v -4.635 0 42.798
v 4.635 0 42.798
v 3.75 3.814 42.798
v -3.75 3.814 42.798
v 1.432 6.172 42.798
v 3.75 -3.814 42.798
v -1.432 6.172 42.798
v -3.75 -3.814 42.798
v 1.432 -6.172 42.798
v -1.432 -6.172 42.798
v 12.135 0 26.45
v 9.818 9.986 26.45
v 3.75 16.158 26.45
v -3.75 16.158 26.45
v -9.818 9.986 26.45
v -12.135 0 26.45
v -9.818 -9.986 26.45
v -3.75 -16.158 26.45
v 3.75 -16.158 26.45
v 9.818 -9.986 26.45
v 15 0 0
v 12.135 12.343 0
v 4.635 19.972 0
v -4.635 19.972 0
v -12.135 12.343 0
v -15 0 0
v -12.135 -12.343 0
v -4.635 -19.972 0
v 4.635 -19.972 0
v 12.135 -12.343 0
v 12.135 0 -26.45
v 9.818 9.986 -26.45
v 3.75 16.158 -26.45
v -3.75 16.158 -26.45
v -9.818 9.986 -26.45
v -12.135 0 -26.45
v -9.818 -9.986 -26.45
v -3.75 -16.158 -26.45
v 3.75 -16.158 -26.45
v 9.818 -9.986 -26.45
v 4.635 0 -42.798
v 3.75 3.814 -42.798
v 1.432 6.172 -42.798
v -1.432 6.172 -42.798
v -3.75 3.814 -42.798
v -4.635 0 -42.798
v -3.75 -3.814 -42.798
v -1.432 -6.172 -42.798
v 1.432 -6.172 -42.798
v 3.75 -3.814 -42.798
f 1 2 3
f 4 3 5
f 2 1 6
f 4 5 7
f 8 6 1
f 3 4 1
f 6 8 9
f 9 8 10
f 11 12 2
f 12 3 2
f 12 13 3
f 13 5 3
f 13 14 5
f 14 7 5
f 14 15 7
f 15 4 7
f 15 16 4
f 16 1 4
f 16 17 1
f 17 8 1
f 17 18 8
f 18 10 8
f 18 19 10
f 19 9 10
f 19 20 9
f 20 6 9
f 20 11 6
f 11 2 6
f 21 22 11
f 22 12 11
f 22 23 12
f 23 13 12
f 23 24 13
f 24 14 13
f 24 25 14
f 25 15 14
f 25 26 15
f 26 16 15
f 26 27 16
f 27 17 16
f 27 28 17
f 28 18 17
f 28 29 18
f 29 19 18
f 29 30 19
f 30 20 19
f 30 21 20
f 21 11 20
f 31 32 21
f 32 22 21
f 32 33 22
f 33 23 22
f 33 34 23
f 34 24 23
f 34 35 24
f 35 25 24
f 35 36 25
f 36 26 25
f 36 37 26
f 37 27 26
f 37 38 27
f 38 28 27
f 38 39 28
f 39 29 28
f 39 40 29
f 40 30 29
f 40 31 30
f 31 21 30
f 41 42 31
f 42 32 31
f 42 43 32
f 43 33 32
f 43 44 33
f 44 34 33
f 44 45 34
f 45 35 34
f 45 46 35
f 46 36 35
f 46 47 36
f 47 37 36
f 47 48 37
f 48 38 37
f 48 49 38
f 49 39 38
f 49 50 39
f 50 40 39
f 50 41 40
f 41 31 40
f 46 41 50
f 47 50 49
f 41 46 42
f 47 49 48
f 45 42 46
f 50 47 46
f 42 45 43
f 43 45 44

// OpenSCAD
// Generated by SolidPython 1.0.1 on 2020-07-29 00:46:46


scale(v = [5, 7, 15]) {
	sphere(r = 3);
}
/***********************************************
*********      SolidPython code:      **********
************************************************
 
# import packages: SolidPython
from solid import *
from solid.utils import *
from itertools import chain, combinations, permutations


class Resize:

    def __init__(self, scad_file):
        self.scad_file = scad_file
        #self.scad_file = import_scad(scad_file)
        # cone/cylinder param:
        self.r1 = 0
        self.r2 = 0
        self.h = 0
        # rectangular prism param:
        self.w = 0
        self.l = 0
        # ellipse param:
        self.r = 0

    # import OpenScad code (file name corresponds to shape)


    # classify shape + parameters
    def assign(self, param1, param2, param3):
        if self.scad_file == 'cone.scad':
            self.r1 = param1
            self.r2 = param2
            self.h = param3
        elif self.scad_file == 'cylinder.scad':
            self.r1 = param1
            self.r2 = param2
            self.h = param3
        elif self.scad_file == 'rectangularPrism.scad':
            self.h = param1
            self.l = param2
            self.w = param3
        else:
            self.r = param1
            self.h = param2

    # resize parameters
    def iterate(self):
        x = range(3, 20, 2)
        i = 1
        if self.scad_file == 'cone.scad':
            tempList = list(permutations(x, 2))
            for temp in tempList:
                param1 = temp[0]
                param2 = temp[1]
                filepath = 'produced_scad_files/' + 'cone' + str(param1) + '_' + str(param2) + '_' + '.scad'
                scad_render_to_file(cylinder(h=param1, r1=param2, r2=0), filepath)

        elif self.scad_file == 'cylinder.scad':
            tempList = list(permutations(x, 3))
            for temp in tempList:
                param1 = temp[0]
                param2 = temp[1]
                filepath = 'produced_scad_files/' + 'cylinder' + str(param1) + '_' + str(param2) + '_' + '.scad'
                scad_render_to_file(cylinder(h=param1, r1=param2, r2=param2), filepath)

        elif self.scad_file == 'rectangularPrism.scad':
            tempList = list(permutations(x, 3))
            for temp in tempList:
                param1 = temp[0]
                param2 = temp[1]
                param3 = temp[2]
                filepath = 'produced_scad_files/' + 'rectangularPrism' + str(param1) + '_' + str(param2) + '_' + str(
                    param3) + '.scad'
                scad_render_to_file(cube(size=(param1, param2, param3)), filepath)

        elif self.scad_file == 'ellipse.scad':
            tempList = list(permutations(x, 4))
            for temp in tempList:
                param1 = temp[0]
                param2 = temp[1]
                param3 = temp[2]
                param4 = temp[3]
                filepath = 'produced_scad_files/' + 'ellipse' + str(param1) + '_' + str(param2) + '_' + str(param3) + '_' + str(param4) + '.scad'
                scad_render_to_file(scale([param1, param2, param3])(sphere(r=param4)), filepath)

    def render_to_scadfile(self):
        scad_render_to_file(scad, 'example.scad') 
 
************************************************/
